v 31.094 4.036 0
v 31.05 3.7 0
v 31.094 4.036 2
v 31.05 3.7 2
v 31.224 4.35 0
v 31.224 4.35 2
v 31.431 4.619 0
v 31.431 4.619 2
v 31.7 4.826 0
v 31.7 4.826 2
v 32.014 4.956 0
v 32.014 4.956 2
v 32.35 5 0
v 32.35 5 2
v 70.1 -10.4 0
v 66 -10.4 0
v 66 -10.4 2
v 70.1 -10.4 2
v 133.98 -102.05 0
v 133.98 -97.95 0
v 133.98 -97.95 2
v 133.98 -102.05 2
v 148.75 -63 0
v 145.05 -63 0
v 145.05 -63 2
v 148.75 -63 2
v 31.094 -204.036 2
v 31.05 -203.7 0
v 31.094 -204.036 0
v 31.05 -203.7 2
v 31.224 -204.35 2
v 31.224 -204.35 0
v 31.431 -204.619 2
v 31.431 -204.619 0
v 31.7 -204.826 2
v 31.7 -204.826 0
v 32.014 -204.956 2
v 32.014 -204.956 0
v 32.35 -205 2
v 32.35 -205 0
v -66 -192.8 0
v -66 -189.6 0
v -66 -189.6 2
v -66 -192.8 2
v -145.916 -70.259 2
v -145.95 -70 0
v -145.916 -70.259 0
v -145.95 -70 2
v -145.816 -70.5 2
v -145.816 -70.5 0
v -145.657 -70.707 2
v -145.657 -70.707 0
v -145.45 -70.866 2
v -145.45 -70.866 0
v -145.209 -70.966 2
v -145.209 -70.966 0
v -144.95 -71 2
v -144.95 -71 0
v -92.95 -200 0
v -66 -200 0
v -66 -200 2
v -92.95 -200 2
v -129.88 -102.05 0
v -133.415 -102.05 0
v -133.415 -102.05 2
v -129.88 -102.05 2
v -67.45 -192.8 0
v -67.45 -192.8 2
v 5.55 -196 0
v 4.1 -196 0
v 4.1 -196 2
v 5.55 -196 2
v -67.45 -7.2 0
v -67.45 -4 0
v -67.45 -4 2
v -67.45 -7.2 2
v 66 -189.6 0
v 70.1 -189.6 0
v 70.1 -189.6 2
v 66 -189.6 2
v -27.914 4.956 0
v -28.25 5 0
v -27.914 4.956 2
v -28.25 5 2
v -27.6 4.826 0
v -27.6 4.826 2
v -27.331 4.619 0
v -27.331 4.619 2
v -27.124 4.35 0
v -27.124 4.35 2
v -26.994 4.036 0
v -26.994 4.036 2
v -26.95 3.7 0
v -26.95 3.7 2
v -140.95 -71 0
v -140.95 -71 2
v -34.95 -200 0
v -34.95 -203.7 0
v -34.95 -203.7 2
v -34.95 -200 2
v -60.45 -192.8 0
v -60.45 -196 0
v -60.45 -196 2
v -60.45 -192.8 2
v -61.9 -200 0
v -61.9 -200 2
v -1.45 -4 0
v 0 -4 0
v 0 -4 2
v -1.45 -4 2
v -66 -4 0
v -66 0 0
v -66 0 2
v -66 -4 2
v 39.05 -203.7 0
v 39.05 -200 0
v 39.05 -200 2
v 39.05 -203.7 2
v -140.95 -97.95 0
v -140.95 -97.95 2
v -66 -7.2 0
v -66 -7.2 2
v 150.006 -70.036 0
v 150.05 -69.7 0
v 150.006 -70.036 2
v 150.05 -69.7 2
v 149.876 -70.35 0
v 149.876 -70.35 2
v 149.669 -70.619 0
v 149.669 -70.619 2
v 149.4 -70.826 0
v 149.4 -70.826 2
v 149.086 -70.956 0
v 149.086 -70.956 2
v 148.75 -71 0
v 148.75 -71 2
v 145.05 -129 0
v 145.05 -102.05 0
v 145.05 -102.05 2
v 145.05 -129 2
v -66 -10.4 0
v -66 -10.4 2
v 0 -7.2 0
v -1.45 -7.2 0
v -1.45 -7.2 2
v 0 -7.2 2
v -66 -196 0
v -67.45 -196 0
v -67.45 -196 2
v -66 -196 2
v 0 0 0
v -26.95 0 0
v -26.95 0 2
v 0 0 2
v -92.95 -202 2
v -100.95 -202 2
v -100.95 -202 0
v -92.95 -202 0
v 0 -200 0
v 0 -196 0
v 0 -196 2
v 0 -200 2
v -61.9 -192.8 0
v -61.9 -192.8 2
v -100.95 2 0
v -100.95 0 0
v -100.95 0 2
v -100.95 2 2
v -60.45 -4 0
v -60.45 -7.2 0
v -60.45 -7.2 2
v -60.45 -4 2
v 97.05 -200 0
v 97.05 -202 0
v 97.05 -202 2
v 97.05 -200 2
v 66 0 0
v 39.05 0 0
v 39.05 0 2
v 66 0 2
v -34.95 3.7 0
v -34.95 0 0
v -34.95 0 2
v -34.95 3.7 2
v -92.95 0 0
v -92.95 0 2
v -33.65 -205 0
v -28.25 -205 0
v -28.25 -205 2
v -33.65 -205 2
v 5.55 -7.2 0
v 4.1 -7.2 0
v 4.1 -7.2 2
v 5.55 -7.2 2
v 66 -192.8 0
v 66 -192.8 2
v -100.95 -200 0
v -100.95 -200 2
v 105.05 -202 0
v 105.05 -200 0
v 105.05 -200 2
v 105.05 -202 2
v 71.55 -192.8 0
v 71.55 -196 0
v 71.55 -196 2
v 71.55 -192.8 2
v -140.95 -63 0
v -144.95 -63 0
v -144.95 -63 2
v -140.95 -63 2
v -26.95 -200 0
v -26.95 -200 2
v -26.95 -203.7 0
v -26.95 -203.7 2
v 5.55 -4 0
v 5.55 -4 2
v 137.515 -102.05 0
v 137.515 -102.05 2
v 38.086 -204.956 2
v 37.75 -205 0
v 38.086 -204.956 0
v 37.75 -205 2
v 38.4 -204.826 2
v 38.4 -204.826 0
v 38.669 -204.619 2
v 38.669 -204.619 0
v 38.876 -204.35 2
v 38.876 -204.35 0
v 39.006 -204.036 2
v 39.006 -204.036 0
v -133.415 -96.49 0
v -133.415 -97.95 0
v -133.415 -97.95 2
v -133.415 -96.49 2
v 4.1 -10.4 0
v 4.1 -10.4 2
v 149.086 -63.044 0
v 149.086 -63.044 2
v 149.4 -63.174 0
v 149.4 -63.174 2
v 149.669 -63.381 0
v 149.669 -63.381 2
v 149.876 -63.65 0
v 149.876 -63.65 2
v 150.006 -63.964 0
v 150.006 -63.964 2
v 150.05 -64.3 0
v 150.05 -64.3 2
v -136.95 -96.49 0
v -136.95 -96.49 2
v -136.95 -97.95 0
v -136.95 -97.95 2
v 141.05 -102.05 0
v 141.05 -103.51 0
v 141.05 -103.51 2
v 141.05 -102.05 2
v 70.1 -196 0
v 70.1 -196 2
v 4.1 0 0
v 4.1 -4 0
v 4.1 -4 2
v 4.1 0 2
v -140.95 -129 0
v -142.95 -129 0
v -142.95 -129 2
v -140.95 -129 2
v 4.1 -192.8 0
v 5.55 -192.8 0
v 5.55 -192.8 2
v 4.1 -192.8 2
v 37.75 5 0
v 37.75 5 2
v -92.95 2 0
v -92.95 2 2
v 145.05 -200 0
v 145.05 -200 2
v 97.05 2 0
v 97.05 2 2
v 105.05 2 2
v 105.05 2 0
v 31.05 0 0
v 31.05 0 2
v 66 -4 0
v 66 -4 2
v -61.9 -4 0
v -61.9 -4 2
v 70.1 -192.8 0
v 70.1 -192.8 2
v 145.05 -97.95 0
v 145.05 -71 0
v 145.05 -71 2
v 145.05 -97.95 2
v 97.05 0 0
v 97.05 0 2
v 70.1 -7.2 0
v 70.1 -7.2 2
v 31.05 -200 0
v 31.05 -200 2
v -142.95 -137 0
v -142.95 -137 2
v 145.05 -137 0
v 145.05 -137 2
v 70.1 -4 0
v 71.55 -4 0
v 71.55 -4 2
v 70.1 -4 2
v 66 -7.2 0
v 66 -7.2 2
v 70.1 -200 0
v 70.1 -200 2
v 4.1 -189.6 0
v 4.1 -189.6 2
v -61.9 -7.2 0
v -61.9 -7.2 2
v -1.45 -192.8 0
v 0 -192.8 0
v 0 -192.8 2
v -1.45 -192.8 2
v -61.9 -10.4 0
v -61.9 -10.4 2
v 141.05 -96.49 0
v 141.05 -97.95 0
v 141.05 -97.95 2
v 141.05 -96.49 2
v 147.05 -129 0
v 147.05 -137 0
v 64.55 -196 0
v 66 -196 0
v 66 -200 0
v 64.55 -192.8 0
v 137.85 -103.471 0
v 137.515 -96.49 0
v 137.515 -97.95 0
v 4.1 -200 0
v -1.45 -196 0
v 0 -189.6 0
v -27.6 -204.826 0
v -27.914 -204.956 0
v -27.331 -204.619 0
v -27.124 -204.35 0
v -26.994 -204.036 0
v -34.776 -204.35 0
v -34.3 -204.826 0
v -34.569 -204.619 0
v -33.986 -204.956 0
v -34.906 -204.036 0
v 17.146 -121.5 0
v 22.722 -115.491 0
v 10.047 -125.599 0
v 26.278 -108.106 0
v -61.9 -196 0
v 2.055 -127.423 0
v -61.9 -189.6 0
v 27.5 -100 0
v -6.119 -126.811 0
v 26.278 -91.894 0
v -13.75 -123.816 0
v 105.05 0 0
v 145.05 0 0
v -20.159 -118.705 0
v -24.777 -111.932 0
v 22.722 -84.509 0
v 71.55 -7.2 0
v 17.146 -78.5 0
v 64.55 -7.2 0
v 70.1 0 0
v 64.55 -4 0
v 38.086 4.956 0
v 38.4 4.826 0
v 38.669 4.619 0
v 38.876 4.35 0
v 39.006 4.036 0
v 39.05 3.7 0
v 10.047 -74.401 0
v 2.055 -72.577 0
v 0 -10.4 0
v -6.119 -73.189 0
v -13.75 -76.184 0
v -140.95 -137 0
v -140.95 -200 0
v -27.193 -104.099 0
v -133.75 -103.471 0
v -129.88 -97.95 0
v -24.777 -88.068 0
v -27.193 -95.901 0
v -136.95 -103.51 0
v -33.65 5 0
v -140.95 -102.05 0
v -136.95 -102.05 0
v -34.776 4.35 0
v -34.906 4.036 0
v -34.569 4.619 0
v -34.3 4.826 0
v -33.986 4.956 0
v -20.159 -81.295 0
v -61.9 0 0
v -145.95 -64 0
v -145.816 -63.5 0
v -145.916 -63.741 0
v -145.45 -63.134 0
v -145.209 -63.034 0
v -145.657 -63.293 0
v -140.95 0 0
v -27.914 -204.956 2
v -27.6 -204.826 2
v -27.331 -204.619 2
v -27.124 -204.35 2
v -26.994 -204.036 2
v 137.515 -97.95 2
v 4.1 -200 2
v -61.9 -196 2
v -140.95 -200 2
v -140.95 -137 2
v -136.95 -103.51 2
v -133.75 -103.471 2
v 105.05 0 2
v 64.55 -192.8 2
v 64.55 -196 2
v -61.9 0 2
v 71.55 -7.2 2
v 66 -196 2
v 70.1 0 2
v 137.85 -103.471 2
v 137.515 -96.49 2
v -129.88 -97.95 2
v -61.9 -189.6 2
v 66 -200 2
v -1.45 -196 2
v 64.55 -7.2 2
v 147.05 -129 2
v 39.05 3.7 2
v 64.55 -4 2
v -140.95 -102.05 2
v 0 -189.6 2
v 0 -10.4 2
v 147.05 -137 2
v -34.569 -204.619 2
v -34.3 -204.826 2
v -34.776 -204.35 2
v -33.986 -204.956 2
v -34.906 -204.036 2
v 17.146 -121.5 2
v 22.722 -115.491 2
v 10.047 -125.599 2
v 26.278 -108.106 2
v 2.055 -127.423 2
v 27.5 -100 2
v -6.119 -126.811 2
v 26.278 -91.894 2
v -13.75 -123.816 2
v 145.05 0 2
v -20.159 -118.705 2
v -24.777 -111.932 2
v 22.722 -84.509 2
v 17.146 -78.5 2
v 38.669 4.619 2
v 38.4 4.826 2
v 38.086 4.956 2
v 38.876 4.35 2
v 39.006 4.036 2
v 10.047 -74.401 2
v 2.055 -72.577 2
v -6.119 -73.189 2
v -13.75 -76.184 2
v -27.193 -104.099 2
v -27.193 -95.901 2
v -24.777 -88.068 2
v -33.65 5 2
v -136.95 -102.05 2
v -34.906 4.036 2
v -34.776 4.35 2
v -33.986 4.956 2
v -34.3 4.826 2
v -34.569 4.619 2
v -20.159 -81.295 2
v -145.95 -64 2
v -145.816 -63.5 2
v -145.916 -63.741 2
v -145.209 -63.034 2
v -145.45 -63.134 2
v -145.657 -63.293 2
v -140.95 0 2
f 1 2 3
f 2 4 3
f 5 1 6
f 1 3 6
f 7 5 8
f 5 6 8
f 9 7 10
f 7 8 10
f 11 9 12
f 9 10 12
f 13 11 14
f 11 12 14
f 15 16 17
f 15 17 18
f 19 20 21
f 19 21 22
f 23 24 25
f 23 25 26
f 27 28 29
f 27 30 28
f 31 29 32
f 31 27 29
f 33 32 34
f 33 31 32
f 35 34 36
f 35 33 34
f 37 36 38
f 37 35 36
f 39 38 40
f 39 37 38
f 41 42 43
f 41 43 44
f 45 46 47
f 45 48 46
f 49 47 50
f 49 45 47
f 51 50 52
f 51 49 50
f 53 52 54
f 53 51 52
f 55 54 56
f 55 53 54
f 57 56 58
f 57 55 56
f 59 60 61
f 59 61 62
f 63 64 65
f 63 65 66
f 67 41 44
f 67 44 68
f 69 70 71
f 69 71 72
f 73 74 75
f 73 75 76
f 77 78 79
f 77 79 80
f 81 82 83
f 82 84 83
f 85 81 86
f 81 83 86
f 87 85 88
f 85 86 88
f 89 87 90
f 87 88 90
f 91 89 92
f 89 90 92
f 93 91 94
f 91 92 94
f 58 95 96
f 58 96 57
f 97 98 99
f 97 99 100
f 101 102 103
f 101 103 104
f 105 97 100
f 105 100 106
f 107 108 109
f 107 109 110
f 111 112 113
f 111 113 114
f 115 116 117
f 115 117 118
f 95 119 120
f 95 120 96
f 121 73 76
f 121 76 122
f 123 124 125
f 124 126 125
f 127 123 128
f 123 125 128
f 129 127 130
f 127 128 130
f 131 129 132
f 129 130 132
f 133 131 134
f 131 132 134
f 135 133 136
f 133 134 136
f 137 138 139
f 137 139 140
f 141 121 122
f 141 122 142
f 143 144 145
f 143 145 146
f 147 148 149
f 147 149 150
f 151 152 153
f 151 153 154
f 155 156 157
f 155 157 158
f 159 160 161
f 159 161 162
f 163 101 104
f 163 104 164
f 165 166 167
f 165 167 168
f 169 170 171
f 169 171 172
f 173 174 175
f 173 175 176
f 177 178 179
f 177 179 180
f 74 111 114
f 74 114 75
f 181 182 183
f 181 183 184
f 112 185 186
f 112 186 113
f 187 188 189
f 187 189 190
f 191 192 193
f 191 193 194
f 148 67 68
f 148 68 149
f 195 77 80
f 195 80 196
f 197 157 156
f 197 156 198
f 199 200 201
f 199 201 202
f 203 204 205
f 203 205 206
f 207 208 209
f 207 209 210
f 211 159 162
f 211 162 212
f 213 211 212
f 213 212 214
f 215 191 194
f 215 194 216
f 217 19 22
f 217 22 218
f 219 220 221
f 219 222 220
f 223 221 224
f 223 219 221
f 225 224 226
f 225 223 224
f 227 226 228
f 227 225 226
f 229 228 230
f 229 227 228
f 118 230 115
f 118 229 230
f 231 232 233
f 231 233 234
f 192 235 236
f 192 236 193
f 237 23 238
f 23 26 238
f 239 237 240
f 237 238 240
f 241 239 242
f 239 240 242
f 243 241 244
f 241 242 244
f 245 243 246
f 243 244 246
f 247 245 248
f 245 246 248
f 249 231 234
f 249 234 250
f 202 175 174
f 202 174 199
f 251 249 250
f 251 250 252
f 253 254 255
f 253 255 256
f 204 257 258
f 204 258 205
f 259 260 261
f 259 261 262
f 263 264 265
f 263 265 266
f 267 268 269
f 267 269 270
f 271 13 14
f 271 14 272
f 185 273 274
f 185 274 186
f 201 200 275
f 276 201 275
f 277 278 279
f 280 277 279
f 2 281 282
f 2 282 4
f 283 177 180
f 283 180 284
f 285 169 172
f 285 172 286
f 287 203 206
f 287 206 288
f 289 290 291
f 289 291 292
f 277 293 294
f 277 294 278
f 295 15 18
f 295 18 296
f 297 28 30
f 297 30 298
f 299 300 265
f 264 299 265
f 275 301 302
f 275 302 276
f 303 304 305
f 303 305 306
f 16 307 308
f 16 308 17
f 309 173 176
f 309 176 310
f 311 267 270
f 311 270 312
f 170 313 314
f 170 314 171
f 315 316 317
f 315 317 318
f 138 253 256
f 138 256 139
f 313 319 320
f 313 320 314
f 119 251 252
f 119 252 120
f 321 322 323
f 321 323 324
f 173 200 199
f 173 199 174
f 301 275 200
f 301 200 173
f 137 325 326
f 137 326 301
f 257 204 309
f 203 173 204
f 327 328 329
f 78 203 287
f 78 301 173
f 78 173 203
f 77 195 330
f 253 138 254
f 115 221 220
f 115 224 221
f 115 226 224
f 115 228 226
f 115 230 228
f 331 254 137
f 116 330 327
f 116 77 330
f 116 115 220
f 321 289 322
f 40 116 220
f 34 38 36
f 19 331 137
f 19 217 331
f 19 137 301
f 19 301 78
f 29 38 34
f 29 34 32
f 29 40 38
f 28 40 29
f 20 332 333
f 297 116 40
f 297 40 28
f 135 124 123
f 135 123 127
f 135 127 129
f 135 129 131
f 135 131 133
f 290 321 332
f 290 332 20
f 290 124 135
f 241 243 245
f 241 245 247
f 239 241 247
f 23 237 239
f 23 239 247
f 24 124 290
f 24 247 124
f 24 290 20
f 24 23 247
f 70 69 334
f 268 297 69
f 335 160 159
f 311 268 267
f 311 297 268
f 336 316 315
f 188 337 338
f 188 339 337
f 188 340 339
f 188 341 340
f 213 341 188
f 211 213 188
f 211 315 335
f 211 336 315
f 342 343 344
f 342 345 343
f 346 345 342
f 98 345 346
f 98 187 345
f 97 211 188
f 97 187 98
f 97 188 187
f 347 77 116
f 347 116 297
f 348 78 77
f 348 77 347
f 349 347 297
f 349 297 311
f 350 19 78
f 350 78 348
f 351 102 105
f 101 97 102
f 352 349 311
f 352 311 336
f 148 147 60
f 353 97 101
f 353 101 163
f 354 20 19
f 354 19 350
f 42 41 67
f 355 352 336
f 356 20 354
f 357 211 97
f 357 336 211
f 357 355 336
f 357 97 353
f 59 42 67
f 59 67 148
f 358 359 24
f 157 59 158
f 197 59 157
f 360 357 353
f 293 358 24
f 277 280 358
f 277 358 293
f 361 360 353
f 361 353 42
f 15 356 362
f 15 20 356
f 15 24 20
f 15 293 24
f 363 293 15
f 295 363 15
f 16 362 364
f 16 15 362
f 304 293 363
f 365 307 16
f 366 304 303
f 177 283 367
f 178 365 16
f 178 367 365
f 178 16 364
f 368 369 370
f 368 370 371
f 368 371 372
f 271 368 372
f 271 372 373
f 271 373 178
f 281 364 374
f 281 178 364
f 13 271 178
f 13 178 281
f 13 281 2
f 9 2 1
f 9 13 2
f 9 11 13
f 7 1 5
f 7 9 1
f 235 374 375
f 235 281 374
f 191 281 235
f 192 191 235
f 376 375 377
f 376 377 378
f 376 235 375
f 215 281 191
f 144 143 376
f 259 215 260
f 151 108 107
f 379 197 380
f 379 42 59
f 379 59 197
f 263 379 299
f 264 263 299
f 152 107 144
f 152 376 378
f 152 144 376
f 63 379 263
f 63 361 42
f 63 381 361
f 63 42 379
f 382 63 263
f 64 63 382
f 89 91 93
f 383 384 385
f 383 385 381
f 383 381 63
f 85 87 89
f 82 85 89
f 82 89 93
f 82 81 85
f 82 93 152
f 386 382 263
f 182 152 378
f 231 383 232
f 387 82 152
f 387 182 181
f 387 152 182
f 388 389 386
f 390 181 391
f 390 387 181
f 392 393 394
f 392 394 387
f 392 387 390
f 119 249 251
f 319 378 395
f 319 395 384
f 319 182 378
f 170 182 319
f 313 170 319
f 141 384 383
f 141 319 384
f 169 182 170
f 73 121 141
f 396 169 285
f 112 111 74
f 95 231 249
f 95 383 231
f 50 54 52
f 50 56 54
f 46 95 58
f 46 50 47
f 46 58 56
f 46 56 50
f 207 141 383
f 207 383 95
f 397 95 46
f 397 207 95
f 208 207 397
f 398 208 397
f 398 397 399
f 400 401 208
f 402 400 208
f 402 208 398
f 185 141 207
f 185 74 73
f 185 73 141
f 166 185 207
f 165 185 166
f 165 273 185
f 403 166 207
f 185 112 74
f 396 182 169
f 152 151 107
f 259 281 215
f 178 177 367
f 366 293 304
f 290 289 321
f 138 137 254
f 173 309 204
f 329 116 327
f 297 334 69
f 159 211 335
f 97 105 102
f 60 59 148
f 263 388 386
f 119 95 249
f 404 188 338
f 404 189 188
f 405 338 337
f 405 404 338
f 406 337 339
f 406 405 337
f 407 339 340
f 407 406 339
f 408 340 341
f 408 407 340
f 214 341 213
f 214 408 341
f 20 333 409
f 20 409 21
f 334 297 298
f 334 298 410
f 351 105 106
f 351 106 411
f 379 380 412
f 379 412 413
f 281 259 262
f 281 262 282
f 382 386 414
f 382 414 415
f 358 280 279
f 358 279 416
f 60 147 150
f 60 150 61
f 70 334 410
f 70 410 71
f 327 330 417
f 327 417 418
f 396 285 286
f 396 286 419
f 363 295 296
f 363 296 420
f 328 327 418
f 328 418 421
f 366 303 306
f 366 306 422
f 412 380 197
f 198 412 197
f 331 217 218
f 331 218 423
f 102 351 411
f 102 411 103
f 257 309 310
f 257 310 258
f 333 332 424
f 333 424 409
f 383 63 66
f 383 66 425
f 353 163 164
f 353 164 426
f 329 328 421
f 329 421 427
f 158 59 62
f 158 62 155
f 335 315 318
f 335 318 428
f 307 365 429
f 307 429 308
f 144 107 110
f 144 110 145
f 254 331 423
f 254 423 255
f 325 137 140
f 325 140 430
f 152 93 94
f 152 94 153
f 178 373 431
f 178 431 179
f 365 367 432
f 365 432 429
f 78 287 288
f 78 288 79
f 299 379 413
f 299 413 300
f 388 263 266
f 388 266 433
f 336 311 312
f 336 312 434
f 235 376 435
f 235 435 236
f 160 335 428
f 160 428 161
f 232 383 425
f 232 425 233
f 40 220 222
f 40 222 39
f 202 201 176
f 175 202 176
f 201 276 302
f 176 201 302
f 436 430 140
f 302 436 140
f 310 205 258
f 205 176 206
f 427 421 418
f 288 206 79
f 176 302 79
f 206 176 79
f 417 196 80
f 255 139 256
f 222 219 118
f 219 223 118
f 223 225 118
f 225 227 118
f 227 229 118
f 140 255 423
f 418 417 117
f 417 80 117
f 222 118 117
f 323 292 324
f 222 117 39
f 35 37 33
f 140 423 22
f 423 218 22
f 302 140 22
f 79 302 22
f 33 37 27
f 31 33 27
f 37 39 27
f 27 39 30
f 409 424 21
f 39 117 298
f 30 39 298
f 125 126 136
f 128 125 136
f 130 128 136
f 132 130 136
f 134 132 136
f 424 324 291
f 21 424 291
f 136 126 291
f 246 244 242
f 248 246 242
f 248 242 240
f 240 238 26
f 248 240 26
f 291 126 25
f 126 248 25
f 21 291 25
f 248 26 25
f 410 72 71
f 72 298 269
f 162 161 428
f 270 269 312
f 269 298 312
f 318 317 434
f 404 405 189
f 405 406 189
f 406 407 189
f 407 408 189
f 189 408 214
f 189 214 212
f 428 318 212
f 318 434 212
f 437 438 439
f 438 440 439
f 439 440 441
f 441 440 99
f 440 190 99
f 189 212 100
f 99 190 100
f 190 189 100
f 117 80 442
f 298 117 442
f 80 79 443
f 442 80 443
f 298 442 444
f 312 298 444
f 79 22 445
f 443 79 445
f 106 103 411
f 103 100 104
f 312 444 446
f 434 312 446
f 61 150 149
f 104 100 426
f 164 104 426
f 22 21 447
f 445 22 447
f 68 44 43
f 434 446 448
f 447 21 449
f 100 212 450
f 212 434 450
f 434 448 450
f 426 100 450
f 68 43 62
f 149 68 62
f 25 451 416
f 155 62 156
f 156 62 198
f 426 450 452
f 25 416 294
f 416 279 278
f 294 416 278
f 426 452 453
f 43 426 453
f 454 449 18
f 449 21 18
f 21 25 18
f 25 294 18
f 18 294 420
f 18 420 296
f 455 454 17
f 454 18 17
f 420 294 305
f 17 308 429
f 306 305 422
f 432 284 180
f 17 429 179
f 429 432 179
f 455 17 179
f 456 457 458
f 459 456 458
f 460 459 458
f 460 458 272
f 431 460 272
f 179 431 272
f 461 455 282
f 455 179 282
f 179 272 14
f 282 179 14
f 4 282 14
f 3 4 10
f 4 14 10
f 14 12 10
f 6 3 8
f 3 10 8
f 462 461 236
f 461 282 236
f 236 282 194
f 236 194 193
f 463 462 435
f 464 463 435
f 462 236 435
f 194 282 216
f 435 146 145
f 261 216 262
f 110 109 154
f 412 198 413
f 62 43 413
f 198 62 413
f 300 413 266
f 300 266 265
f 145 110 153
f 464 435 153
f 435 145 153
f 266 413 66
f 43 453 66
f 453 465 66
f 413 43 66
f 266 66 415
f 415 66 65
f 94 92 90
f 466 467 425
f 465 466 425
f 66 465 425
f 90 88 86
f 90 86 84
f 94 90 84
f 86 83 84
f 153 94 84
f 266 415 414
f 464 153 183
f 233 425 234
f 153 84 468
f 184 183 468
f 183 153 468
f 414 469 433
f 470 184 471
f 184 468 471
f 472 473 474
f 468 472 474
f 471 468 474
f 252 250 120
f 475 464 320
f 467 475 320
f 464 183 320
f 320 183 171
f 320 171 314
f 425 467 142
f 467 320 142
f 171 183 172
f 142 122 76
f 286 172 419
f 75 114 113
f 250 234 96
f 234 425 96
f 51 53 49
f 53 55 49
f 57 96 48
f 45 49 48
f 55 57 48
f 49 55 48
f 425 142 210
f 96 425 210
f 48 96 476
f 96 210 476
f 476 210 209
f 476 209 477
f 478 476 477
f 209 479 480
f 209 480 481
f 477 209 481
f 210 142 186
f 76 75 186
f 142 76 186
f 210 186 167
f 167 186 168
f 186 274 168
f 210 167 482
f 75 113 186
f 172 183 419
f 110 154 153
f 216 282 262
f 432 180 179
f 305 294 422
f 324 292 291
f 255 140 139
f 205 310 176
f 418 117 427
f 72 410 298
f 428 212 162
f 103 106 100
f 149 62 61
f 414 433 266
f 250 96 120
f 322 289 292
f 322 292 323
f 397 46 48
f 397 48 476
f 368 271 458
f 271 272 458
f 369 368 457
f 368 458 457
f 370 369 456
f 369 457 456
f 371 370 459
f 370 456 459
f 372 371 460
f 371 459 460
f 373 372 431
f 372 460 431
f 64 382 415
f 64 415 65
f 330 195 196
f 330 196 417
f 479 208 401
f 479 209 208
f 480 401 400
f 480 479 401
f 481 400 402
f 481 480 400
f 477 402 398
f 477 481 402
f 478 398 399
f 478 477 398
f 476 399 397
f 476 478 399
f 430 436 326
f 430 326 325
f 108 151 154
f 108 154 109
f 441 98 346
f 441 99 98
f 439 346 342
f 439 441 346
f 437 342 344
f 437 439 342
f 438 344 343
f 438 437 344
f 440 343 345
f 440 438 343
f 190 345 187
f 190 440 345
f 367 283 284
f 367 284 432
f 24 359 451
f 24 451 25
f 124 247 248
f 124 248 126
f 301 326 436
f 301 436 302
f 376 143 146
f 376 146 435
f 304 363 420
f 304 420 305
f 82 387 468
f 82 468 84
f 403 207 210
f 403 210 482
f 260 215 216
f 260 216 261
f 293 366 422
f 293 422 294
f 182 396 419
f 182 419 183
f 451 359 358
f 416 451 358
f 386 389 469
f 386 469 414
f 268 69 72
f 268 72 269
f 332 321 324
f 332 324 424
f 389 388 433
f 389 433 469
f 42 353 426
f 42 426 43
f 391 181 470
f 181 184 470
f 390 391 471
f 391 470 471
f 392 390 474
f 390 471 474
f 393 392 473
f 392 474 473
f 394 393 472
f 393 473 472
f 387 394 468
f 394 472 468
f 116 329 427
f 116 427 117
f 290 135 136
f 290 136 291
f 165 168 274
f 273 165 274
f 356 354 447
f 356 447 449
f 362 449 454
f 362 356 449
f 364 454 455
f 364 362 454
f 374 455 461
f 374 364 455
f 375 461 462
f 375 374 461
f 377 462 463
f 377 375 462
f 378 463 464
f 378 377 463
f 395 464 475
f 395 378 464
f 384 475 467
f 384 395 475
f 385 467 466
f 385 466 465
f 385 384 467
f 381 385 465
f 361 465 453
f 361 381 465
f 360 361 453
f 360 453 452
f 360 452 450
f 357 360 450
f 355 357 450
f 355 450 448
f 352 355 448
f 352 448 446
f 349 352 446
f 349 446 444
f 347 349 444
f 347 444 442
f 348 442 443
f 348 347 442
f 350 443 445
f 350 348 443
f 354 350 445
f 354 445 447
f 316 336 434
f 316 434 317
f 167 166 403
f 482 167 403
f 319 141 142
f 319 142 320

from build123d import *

# Parameters (mm, degrees)
SKETCH_1_R          = 27.5
EXTRUDE_1_DEPTH     = 2
FILLET_1_R          = 1
FILLET_2_R          = 1.3
SKETCH_4_W          = 16.091181195
SKETCH_4_H          = 8.262872831
SKETCH_4_W_2        = 19.931884343
SKETCH_4_W_3        = 14.487561678
SKETCH_4_H_2        = 5.890006991
SKETCH_4_W_4        = 16.715065691
SKETCH_4_H_3        = 8.177759915
SKETCH_4_W_5        = 10.105714663
SKETCH_4_H_4        = 26.066396506
SKETCH_4_W_6        = 5.661455371
SKETCH_4_H_5        = 27.456761526
CUT_EXTRUDE_1_DEPTH = 2


with BuildPart() as part:
    # 草图1 → 凸台-拉伸1 (new body)
    with BuildSketch(Plane.XY):
        Polygon((0, 0), (0, -4), (-1.45, -4), (-1.45, -7.2), (0, -7.2), (0, -10.4), (4.1, -10.4), (4.1, -7.2), (5.55, -7.2), (5.55, -4), (4.1, -4), (4.1, 0), (31.05, 0), (31.05, 5), (39.05, 5), (39.05, 0), (66, 0), (66, -4), (64.55, -4), (64.55, -7.2), (66, -7.2), (66, -10.4), (70.1, -10.4), (70.1, -7.2), (71.55, -7.2), (71.55, -4), (70.1, -4), (70.1, 0), (97.05, 0), (97.05, 5), (105.05, 5), (105.05, 0), (132, 0), (145.05, 0), (145.05, -63), (150.05, -63), (150.05, -71), (145.05, -71), (145.05, -97.95), (141.05, -97.95), (141.05, -96.490258022), (137.515203406, -96.490258022), (137.515203406, -97.95), (133.980406811, -97.95), (133.980406811, -102.05), (137.515203406, -102.05), (137.850237274, -103.470774067), (141.05, -103.509741978), (141.05, -102.05), (145.05, -102.05), (145.05, -129), (150.05, -129), (150.05, -137), (145.05, -137), (145.05, -200), (132, -200), (105.05, -200), (105.05, -205), (97.05, -205), (97.05, -200), (70.1, -200), (70.1, -196), (71.55, -196), (71.55, -192.8), (70.1, -192.8), (70.1, -189.6), (66, -189.6), (66, -192.8), (64.55, -192.8), (64.55, -196), (66, -196), (66, -200), (39.05, -200), (39.05, -205), (31.05, -205), (31.05, -200), (4.1, -200), (4.1, -196), (5.55, -196), (5.55, -192.8), (4.1, -192.8), (4.1, -189.6), (0, -189.6), (0, -192.8), (-1.45, -192.8), (-1.45, -196), (0, -196), (0, -200), (-26.95, -200), (-26.95, -205), (-34.95, -205), (-34.95, -200), (-61.9, -200), (-61.9, -196), (-60.45, -196), (-60.45, -192.8), (-61.9, -192.8), (-61.9, -189.6), (-66, -189.6), (-66, -192.8), (-67.45, -192.8), (-67.45, -196), (-66, -196), (-66, -200), (-92.95, -200), (-92.95, -205), (-100.95, -205), (-100.95, -200), (-127.9, -200), (-140.95, -200), (-140.95, -137), (-145.95, -137), (-145.95, -129), (-140.95, -129), (-140.95, -102.05), (-136.95, -102.05), (-136.95, -103.509741978), (-133.750237274, -103.470774067), (-133.415203406, -102.05), (-129.880406811, -102.05), (-129.880406811, -97.95), (-133.415203406, -97.95), (-133.415203406, -96.490258022), (-136.95, -96.490258022), (-136.95, -97.95), (-140.95, -97.95), (-140.95, -71), (-145.95, -71), (-145.95, -63), (-140.95, -63), (-140.95, 0), (-127.9, 0), (-100.95, 0), (-100.95, 5), (-92.95, 5), (-92.95, 0), (-66, 0), (-66, -4), (-67.45, -4), (-67.45, -7.2), (-66, -7.2), (-66, -10.4), (-61.9, -10.4), (-61.9, -7.2), (-60.45, -7.2), (-60.45, -4), (-61.9, -4), (-61.9, 0), (-34.95, 0), (-34.95, 5), (-26.95, 5), (-26.95, 0), align=None)
        with Locations((0, -100)):
            Circle(SKETCH_1_R, mode=Mode.SUBTRACT)
    extrude(amount=EXTRUDE_1_DEPTH)

    # 圆角1
    fillet_1_edges = [part.edges().sort_by_distance(p)[0] for p in [
        (-145.95, -63, 1),
        (-145.95, -71, 1),
        (-145.95, -129, 1),
        (-145.95, -137, 1),
    ]]
    fillet(fillet_1_edges, radius=FILLET_1_R)

    # 圆角2
    fillet_2_edges = [part.edges().sort_by_distance(p)[0] for p in [
        (39.05, 5, 1),
        (31.05, 5, 1),
        (-26.95, 5, 1),
        (-34.95, 5, 1),
        (-92.95, 5, 1),
        (-100.95, 5, 1),
        (-100.95, -205, 1),
        (-92.95, -205, 1),
        (-34.95, -205, 1),
        (-26.95, -205, 1),
        (31.05, -205, 1),
        (39.05, -205, 1),
        (97.05, -205, 1),
        (105.05, -205, 1),
        (150.05, -137, 1),
        (150.05, -129, 1),
        (150.05, -71, 1),
        (150.05, -63, 1),
        (105.05, 5, 1),
        (97.05, 5, 1),
    ]]
    fillet(fillet_2_edges, radius=FILLET_2_R)

    # 草图4 → 切除-拉伸1 (cut)
    with BuildSketch(Plane.XY.offset(2)):
        with Locations((-95.339833075, 6.131436416)):
            Rectangle(SKETCH_4_W, SKETCH_4_H)
        with Locations((100.859067665, 6.131436416)):
            Rectangle(SKETCH_4_W_2, SKETCH_4_H)
        with Locations((-97.37103045, -204.945003496)):
            Rectangle(SKETCH_4_W_3, SKETCH_4_H_2)
        with Locations((102.467476991, -206.088879958)):
            Rectangle(SKETCH_4_W_4, SKETCH_4_H_3)
        with Locations((-148.002857332, -124.681219337)):
            Rectangle(SKETCH_4_W_5, SKETCH_4_H_4)
        with Locations((149.880727686, -127.664492951)):
            Rectangle(SKETCH_4_W_6, SKETCH_4_H_5)
    extrude(amount=-CUT_EXTRUDE_1_DEPTH, mode=Mode.SUBTRACT)


solid = part.part
